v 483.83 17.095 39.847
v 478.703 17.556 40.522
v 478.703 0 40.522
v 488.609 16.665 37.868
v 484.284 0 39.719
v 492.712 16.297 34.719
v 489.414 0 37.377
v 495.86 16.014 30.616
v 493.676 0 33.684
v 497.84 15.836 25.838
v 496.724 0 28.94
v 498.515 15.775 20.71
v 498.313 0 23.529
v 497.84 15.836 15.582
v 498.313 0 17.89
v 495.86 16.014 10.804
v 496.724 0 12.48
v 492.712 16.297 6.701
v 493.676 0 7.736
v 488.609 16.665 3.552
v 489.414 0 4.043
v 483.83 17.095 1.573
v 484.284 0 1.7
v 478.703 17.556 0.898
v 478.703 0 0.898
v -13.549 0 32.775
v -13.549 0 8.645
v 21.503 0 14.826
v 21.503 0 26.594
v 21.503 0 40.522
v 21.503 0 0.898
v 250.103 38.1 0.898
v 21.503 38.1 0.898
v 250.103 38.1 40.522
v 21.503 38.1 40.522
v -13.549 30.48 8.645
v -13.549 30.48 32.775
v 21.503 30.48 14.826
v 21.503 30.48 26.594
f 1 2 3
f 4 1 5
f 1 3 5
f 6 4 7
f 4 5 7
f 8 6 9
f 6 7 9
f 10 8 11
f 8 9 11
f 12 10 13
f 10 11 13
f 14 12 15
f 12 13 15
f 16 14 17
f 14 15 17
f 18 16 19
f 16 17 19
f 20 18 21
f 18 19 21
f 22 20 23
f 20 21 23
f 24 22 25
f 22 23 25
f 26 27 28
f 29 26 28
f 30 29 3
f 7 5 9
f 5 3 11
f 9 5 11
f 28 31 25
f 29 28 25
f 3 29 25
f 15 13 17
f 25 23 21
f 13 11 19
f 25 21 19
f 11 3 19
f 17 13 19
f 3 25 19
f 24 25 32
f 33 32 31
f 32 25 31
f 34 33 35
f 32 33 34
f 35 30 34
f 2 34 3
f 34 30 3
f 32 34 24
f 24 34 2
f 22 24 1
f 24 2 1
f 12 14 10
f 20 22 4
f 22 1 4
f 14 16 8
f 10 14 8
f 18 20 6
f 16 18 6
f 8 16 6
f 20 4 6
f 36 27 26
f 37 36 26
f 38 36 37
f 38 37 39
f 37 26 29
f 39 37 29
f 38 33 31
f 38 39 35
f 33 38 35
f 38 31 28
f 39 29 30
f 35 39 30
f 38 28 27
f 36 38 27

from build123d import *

# Parameters (mm, degrees)
BOSS_EXTRUDE1_DEPTH = 38.1
CUT_EXTRUDE1_DEPTH  = 7.62
CUT_EXTRUDE4_DEPTH  = 39.624


with BuildPart() as part:
    # Sketch2 → Boss-Extrude1 (new body)
    with BuildSketch(Plane(origin=(0, 0, 0), x_dir=(1, 0, 0), z_dir=(0, 1, 0))):
        with BuildLine():
            Line((-13.549240888, -8.64489), (-13.549240888, -32.77489))
            Line((-13.549240888, -32.77489), (21.502759112, -26.594276672))
            Line((21.502759112, -26.594276672), (21.502759112, -40.52189))
            Line((21.502759112, -40.52189), (478.702759112, -40.52189))
            ThreePointArc((478.702759112, -40.52189), (498.514759112, -20.70989), (478.702759112, -0.89789))
            Line((478.702759112, -0.89789), (21.502759112, -0.89789))
            Line((21.502759112, -0.89789), (21.502759112, -14.825503328))
            Line((21.502759112, -14.825503328), (-13.549240888, -8.64489))
        make_face()
    extrude(amount=BOSS_EXTRUDE1_DEPTH)

    # Sketch3 → Cut-Extrude1 (cut)
    with BuildSketch(Plane(origin=(0, 38.1, 0), x_dir=(1, 0, 0), z_dir=(0, 1, 0))):
        Polygon((-13.549240888, -8.64489), (-13.549240888, -32.77489), (21.502759112, -26.594276672), (21.502759112, -14.825503328), align=None)
    extrude(amount=-CUT_EXTRUDE1_DEPTH, mode=Mode.SUBTRACT)

    # Sketch5 → Cut-Extrude4 (cut)
    with BuildSketch(Plane.XY.offset(40.52189)):
        Polygon((250.102759112, 38.1), (498.514759112, 15.775221318), (498.514759112, 38.1), align=None)
    extrude(amount=-CUT_EXTRUDE4_DEPTH, mode=Mode.SUBTRACT)


solid = part.part
